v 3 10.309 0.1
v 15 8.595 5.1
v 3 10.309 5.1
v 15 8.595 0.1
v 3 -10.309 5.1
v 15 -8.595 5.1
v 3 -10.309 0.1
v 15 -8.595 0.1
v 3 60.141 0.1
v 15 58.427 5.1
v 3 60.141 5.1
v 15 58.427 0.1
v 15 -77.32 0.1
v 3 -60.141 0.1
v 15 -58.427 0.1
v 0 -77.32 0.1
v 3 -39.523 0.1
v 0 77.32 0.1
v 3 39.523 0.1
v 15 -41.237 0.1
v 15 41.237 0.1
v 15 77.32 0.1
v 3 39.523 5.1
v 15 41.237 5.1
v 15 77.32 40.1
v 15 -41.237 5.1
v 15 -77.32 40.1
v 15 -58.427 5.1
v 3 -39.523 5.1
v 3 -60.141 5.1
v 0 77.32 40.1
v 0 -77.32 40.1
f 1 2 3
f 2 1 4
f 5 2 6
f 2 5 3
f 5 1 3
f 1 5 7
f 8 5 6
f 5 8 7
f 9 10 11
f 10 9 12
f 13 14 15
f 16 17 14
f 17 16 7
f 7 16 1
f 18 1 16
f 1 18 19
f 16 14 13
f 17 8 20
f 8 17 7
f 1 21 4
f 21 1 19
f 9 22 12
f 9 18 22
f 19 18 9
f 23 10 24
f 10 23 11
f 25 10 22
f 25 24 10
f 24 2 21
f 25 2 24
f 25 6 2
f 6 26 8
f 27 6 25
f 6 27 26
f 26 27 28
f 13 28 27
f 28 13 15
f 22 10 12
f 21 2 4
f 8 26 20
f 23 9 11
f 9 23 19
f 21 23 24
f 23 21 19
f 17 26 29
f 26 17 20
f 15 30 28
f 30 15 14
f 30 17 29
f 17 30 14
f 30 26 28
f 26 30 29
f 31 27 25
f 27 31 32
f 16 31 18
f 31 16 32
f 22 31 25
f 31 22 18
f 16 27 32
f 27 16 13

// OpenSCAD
// file: mirror_copy.scad
module mirror_copy(vector=[1,0,0]){
    children();
    mirror(vector) children();
}
// main file
use<mirror_copy.scad>

shrinkage=100/97;
lp=12;   //length of pin
wp=20*shrinkage;  //width of pin
wt=30*shrinkage;//width of tail
tt=15;  //thickness of tail
tp=5;   //thickness of pin
n=3;    //number of pins
wb=150*shrinkage;  //board width
lb=40;
clearance=0;
taper=lp/7;
pitch=wt+wp-taper;

//translate([-0.1,0,0])board(lb+2*(tt-lp),wb,tp,tt,lp,pin=true);
translate([0,0,0.1])board(lb,wb,tp,tt,lp,pin=false);

module board(lb=200,w=150,tp=15,tt=20,lp,pin=true){
    if(pin){
        t=tp;   //set board thickness to pin thickness
        translate([tt,-w/2,0])color("Red")cube([lb-2*(tt-lp),w,t]); //board
        translate([tt-lp,0,0])color("lightGray")pin(lp,wp,tp,clearance);    //centre pin
        for(i=[0:(n-1)/2])translate([tt-lp,0,0])
            mirror_copy([0,1,0])translate([0,i*pitch,0])color("lightGray")
            pin(lp,wp,tp,clearance);    //outer pins
    }
    else{
        t=tt;   //set board thickness to tail thickness
        difference(){
            translate([0,-w/2,0])color("Blue")cube([tt,w,lb]);   //board
            translate([tt-lp,0,0])pin(lp,wp,tp,clearance);    //centre pin
            for(i=[0:(n-1)/2])  
                mirror_copy([0,1,0])translate([tt-lp,i*pitch,0])color("lightGray")
                pin(lp,wp,tp,clearance);  //outer pin sockets
        }
    }
}

module pin(l,w,t,clearance){
    translate([0,0,t/2]){   //move to Z0
        path=[
        [0,0],
        [0,(w-clearance)/2],
        [l,w/2-taper],
        [l,taper-w/2],
        [0,(clearance-w)/2]
        ];
        translate([0,0,-t/2])
        linear_extrude(t)polygon(path);
    }    
}
